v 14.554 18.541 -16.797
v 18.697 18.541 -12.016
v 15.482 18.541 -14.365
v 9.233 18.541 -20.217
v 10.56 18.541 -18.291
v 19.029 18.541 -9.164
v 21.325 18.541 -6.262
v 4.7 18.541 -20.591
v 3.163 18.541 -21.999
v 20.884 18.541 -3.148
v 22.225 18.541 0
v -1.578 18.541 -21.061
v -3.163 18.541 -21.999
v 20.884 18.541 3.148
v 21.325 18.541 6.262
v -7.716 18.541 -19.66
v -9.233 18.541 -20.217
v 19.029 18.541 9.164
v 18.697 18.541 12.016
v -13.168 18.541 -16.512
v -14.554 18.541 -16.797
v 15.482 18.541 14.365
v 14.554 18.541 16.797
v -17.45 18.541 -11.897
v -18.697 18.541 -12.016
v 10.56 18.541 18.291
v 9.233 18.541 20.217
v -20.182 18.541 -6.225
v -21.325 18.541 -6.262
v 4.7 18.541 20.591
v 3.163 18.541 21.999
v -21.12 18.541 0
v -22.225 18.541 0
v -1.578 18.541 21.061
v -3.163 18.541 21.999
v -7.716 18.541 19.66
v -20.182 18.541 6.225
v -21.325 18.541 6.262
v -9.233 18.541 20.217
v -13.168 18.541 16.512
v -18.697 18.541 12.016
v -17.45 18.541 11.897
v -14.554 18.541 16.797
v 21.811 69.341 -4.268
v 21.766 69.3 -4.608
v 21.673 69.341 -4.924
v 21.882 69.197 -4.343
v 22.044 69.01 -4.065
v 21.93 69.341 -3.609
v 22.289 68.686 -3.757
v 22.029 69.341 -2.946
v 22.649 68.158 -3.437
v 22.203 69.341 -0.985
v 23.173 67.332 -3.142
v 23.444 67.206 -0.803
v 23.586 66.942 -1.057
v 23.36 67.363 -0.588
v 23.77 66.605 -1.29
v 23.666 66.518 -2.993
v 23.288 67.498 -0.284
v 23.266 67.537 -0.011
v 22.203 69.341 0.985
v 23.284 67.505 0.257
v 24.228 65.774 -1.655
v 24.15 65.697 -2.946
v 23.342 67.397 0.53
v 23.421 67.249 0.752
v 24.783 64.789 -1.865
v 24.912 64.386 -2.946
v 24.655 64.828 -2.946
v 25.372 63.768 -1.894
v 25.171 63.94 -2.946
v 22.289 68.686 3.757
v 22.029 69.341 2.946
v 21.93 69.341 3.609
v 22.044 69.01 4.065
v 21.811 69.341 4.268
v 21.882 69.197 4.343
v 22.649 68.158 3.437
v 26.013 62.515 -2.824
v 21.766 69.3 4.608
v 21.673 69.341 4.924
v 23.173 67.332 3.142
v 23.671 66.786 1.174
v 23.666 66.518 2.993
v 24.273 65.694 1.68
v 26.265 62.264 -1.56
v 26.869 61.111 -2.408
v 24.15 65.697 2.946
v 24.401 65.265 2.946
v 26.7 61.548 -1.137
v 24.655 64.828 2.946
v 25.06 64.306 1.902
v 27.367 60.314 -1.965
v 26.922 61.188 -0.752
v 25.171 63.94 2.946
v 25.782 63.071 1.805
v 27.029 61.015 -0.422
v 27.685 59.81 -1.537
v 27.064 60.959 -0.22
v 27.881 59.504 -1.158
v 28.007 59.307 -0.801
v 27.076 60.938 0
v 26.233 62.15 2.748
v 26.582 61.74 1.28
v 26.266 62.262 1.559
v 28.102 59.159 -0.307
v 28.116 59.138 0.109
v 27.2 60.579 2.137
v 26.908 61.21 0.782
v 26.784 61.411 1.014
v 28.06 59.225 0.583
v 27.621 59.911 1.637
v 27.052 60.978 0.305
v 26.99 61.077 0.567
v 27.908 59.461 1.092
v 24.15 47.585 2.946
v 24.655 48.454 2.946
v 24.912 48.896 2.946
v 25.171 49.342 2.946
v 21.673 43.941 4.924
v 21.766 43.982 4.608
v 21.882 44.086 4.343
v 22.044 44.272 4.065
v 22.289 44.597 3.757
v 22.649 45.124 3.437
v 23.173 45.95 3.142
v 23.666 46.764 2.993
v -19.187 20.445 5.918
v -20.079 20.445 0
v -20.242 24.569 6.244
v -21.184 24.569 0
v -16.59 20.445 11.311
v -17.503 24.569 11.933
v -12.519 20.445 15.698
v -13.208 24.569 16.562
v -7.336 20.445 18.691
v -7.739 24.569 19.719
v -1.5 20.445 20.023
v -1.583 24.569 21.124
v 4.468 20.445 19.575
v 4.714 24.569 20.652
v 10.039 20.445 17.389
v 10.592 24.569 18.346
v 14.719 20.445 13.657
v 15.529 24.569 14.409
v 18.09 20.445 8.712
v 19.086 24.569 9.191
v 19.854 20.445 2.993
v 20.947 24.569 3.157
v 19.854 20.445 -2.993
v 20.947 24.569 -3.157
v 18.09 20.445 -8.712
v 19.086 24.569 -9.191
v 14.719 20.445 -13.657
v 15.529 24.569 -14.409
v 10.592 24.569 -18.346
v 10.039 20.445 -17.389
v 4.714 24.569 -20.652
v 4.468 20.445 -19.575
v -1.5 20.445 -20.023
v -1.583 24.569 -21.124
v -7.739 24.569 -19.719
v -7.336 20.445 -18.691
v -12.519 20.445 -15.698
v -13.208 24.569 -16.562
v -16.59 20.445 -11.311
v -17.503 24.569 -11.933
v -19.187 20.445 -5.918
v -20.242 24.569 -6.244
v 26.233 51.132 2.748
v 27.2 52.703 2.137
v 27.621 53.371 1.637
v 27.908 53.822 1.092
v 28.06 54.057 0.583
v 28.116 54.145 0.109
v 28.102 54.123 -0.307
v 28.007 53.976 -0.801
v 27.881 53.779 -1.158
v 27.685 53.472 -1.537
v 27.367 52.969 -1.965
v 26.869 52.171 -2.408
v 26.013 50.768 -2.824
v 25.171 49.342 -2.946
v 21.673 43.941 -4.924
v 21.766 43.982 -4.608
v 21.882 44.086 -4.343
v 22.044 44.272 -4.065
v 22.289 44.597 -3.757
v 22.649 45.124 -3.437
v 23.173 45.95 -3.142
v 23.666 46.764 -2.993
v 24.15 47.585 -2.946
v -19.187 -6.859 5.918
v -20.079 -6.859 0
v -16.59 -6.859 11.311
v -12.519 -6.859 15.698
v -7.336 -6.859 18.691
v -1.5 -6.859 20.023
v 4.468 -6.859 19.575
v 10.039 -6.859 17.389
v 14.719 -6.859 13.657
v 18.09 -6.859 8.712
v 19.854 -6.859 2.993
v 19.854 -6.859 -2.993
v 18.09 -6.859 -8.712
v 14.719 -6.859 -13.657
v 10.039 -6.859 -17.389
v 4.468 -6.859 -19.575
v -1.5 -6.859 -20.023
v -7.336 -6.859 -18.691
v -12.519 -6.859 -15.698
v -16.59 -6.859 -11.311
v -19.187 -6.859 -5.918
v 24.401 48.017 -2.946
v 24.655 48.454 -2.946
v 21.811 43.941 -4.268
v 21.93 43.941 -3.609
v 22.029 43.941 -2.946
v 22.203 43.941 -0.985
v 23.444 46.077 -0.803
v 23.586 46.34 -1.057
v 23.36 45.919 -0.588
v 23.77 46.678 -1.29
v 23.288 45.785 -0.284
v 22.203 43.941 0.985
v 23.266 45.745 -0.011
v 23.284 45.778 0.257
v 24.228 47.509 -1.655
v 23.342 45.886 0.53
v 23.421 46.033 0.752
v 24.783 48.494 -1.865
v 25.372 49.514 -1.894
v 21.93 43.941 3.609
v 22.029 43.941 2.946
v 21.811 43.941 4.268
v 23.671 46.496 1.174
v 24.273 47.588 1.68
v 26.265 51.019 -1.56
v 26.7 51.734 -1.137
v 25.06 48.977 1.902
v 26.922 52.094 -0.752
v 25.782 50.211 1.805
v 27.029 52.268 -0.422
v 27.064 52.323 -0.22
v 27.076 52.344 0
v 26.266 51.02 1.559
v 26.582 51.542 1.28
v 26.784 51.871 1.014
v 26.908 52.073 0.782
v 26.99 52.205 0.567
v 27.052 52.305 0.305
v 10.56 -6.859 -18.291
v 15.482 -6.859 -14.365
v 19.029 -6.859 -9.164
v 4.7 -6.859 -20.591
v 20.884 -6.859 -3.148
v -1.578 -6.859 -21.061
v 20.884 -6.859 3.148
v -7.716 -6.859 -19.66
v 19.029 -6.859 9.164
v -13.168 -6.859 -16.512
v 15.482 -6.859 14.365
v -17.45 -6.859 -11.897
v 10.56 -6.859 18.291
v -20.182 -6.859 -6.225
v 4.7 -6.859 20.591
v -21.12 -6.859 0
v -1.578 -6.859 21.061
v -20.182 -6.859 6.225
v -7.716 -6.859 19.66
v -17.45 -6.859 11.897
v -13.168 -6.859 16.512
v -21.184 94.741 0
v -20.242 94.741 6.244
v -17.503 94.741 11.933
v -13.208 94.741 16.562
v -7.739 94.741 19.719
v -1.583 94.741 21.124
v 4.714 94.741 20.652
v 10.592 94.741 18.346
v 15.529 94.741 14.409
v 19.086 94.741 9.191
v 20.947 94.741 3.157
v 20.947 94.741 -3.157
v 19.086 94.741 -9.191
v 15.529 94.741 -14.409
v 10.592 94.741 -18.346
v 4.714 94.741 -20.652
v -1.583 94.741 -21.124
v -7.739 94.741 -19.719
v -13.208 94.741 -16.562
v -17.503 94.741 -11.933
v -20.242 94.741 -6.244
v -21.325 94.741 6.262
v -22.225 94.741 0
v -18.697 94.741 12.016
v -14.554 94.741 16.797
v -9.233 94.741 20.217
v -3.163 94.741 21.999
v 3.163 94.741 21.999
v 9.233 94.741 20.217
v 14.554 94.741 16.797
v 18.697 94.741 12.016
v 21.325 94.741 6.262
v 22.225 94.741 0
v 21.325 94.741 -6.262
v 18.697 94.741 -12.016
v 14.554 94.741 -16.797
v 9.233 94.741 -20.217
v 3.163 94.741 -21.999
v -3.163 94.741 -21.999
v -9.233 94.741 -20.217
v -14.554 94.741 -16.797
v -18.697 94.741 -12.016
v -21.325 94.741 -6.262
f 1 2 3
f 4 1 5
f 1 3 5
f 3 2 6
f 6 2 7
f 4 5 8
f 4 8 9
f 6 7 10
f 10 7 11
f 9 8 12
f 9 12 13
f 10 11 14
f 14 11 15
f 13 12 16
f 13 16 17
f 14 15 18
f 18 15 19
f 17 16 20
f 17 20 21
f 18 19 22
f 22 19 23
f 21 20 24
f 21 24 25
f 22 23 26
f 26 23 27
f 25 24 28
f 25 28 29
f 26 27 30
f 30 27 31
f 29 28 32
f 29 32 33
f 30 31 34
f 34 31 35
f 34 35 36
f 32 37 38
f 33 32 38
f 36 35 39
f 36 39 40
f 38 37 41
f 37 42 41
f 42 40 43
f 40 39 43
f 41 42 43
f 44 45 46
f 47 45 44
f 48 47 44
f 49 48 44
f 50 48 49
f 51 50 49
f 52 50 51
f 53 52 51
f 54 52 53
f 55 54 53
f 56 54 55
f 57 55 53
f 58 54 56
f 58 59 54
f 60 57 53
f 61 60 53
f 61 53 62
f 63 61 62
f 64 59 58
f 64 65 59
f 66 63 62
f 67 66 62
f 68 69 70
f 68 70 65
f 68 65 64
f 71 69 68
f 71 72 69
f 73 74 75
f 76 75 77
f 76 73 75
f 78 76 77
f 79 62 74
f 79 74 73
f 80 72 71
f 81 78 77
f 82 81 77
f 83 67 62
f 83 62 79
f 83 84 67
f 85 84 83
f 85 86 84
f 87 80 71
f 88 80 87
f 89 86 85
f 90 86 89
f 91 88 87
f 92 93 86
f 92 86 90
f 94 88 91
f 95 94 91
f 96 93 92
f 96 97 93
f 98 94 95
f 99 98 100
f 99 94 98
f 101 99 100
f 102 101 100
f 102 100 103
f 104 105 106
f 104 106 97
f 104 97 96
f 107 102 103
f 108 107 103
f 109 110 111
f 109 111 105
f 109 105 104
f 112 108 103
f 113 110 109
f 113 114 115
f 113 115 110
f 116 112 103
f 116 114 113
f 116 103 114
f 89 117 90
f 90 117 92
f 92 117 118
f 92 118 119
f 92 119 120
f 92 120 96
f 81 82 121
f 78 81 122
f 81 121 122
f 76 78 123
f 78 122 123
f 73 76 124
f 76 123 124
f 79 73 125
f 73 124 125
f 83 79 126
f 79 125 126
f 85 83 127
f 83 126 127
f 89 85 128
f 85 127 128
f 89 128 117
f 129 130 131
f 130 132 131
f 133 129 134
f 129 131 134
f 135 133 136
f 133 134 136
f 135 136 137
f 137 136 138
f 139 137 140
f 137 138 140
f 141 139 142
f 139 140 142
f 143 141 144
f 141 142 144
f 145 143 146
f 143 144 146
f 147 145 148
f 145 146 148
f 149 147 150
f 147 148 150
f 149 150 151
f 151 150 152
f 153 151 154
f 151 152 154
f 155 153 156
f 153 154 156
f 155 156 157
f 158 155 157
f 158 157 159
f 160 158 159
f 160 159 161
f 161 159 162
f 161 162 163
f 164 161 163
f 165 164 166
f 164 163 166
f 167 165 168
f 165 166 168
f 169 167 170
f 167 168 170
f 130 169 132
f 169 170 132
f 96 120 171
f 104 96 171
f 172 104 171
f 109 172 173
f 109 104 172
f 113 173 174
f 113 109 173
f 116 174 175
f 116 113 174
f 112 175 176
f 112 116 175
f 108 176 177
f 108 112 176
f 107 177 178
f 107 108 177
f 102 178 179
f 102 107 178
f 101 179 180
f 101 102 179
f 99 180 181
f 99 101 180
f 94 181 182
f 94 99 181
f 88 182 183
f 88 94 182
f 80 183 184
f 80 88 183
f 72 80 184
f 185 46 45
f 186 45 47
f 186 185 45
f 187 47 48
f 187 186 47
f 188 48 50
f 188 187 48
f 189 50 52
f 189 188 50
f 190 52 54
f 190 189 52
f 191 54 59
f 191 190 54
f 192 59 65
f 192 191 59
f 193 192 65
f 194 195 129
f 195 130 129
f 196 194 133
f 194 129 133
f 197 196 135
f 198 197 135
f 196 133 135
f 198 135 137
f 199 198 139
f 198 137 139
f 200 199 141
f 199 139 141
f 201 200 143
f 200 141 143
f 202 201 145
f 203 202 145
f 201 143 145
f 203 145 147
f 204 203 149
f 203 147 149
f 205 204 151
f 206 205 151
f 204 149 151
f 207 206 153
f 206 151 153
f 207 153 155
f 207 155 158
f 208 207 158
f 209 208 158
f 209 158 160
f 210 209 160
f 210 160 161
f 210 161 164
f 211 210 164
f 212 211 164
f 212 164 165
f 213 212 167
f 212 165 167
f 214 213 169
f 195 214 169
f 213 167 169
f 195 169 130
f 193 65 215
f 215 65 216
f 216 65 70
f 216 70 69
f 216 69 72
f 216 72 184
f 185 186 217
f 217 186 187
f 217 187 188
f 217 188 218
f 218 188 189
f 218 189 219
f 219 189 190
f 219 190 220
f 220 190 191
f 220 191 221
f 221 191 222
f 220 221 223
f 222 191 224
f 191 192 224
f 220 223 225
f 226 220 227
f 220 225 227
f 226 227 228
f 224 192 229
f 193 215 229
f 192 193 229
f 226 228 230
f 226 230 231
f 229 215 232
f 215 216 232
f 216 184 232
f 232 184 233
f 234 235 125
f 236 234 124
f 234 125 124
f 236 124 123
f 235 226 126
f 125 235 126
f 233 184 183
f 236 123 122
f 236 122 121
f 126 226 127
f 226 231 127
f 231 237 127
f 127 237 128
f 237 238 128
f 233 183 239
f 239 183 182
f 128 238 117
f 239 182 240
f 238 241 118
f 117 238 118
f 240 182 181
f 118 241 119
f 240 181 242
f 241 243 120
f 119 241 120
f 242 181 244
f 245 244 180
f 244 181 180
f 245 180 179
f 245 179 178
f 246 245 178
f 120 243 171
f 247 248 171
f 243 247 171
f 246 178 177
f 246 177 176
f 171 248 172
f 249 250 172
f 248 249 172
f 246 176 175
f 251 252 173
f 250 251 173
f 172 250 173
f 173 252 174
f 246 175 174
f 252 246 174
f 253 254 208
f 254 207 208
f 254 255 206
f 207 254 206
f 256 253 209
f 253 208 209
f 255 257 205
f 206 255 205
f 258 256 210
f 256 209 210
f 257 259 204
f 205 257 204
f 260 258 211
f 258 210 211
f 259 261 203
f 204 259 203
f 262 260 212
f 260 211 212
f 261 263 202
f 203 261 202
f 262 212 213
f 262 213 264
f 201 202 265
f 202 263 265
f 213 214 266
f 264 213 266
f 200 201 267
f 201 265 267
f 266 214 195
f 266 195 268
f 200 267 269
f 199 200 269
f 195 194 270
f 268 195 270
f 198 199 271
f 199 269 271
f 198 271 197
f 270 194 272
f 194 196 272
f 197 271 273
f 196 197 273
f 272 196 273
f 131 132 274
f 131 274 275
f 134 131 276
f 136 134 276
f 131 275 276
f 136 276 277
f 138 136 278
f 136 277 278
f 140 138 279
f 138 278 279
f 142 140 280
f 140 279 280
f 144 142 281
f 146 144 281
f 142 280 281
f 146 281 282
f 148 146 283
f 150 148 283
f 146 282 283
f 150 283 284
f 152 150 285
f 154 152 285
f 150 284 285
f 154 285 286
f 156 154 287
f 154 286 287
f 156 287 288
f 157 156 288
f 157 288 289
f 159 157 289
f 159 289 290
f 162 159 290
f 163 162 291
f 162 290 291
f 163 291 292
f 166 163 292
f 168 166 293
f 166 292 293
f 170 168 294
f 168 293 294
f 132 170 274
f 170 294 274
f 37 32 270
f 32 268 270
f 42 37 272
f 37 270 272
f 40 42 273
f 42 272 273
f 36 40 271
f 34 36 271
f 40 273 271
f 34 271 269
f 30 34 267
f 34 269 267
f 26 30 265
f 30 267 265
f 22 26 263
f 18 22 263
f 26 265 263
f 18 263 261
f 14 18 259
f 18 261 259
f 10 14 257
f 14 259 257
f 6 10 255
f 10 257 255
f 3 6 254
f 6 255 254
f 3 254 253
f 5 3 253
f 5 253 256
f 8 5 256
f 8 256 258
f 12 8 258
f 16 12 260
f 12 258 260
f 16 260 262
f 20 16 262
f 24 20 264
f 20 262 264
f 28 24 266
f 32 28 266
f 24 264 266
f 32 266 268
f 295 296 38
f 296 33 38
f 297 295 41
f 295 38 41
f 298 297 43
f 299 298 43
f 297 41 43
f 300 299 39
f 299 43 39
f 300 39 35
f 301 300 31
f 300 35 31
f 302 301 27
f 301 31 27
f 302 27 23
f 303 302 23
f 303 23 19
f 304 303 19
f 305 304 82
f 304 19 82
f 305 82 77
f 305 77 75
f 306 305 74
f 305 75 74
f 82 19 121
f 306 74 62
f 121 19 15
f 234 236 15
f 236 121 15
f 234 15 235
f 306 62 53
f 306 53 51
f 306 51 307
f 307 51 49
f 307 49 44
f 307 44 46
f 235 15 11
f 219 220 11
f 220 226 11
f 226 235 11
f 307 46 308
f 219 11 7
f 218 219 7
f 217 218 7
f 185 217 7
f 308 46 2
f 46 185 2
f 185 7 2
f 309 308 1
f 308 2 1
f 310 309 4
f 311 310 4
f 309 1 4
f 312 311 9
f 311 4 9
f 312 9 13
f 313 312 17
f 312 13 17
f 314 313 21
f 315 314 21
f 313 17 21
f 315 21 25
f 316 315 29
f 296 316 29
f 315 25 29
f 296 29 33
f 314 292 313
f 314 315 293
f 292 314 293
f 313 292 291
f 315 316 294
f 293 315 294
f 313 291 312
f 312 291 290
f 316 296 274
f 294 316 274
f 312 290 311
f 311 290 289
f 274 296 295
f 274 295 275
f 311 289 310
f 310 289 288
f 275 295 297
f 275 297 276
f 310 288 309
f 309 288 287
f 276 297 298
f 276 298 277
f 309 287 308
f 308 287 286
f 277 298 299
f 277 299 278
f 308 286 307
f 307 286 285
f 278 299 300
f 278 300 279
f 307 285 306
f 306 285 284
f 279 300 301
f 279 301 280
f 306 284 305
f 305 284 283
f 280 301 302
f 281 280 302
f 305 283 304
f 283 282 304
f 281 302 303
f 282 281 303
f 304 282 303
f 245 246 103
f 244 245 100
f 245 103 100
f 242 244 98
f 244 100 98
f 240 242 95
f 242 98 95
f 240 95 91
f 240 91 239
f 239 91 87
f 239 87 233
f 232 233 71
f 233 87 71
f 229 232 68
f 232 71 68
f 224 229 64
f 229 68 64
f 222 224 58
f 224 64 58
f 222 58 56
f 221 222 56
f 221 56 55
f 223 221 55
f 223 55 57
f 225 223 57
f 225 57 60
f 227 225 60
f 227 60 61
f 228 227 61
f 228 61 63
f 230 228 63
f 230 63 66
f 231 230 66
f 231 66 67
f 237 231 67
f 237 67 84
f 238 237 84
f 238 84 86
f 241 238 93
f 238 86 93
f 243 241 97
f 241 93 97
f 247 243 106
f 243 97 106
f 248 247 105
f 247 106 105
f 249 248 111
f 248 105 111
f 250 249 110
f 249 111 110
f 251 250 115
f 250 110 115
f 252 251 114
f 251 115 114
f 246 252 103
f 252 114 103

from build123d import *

# Parameters (mm, degrees)
BOSS_EXTRUDE1_START = -25.4
SKETCH2_R           = 1.905
BOSS_EXTRUDE1_DEPTH = 25.4
FILLET1_R           = 2.54


with BuildPart() as part:
    # Sketch1 → Revolve1 (revolve)
    with BuildSketch(Plane.XY):
        Polygon((-20.0787, -6.858779284), (-20.0787, 20.444981856), (-21.1836, 24.568524793), (-21.1836, 94.741220716), (-22.225, 94.741220716), (-22.225, 18.541220716), (-21.1201, 18.541220716), (-21.1201, -6.858779284), align=None)
    revolve(axis=Axis((0, 0, 0), (0, 1, 0)))

    # Sketch2 → Boss-Extrude1 (add)
    with BuildSketch(Plane(origin=(0, 94.741220716, 0), x_dir=(1, 0, 0), z_dir=(0, 1, 0)).offset(BOSS_EXTRUDE1_START)):
        with BuildLine():
            Line((25.1714, 2.9464), (22.02883002, 2.9464))
            ThreePointArc((22.02883002, 2.9464), (22.225, 0), (22.02883002, -2.9464))
            Line((22.02883002, -2.9464), (25.1714, -2.9464))
            ThreePointArc((25.1714, -2.9464), (28.1178, 0), (25.1714, 2.9464))
        make_face()
        with Locations((25.1714, 0)):
            Circle(SKETCH2_R, mode=Mode.SUBTRACT)
    extrude(amount=-BOSS_EXTRUDE1_DEPTH)

    # Fillet1
    fillet1_edges = [part.edges().sort_by_distance(p)[0] for p in [
        (22.02883002, 56.641220716, 2.9464),
        (22.02883002, 56.641220716, -2.9464),
    ]]
    fillet(fillet1_edges, radius=FILLET1_R)

    # Sketch3 → Cut-Revolve2 (revolve, cut)
    with BuildSketch(Plane.XY):
        Polygon((22.225, 69.341220716), (28.1178, 59.134591717), (28.1178, 69.341220716), align=None)
        Polygon((22.225, 43.941220716), (28.1178, 54.147849715), (28.1178, 43.941220716), align=None)
    revolve(axis=Axis((0, 0, 0), (0, -1, 0)), mode=Mode.SUBTRACT)


solid = part.part
